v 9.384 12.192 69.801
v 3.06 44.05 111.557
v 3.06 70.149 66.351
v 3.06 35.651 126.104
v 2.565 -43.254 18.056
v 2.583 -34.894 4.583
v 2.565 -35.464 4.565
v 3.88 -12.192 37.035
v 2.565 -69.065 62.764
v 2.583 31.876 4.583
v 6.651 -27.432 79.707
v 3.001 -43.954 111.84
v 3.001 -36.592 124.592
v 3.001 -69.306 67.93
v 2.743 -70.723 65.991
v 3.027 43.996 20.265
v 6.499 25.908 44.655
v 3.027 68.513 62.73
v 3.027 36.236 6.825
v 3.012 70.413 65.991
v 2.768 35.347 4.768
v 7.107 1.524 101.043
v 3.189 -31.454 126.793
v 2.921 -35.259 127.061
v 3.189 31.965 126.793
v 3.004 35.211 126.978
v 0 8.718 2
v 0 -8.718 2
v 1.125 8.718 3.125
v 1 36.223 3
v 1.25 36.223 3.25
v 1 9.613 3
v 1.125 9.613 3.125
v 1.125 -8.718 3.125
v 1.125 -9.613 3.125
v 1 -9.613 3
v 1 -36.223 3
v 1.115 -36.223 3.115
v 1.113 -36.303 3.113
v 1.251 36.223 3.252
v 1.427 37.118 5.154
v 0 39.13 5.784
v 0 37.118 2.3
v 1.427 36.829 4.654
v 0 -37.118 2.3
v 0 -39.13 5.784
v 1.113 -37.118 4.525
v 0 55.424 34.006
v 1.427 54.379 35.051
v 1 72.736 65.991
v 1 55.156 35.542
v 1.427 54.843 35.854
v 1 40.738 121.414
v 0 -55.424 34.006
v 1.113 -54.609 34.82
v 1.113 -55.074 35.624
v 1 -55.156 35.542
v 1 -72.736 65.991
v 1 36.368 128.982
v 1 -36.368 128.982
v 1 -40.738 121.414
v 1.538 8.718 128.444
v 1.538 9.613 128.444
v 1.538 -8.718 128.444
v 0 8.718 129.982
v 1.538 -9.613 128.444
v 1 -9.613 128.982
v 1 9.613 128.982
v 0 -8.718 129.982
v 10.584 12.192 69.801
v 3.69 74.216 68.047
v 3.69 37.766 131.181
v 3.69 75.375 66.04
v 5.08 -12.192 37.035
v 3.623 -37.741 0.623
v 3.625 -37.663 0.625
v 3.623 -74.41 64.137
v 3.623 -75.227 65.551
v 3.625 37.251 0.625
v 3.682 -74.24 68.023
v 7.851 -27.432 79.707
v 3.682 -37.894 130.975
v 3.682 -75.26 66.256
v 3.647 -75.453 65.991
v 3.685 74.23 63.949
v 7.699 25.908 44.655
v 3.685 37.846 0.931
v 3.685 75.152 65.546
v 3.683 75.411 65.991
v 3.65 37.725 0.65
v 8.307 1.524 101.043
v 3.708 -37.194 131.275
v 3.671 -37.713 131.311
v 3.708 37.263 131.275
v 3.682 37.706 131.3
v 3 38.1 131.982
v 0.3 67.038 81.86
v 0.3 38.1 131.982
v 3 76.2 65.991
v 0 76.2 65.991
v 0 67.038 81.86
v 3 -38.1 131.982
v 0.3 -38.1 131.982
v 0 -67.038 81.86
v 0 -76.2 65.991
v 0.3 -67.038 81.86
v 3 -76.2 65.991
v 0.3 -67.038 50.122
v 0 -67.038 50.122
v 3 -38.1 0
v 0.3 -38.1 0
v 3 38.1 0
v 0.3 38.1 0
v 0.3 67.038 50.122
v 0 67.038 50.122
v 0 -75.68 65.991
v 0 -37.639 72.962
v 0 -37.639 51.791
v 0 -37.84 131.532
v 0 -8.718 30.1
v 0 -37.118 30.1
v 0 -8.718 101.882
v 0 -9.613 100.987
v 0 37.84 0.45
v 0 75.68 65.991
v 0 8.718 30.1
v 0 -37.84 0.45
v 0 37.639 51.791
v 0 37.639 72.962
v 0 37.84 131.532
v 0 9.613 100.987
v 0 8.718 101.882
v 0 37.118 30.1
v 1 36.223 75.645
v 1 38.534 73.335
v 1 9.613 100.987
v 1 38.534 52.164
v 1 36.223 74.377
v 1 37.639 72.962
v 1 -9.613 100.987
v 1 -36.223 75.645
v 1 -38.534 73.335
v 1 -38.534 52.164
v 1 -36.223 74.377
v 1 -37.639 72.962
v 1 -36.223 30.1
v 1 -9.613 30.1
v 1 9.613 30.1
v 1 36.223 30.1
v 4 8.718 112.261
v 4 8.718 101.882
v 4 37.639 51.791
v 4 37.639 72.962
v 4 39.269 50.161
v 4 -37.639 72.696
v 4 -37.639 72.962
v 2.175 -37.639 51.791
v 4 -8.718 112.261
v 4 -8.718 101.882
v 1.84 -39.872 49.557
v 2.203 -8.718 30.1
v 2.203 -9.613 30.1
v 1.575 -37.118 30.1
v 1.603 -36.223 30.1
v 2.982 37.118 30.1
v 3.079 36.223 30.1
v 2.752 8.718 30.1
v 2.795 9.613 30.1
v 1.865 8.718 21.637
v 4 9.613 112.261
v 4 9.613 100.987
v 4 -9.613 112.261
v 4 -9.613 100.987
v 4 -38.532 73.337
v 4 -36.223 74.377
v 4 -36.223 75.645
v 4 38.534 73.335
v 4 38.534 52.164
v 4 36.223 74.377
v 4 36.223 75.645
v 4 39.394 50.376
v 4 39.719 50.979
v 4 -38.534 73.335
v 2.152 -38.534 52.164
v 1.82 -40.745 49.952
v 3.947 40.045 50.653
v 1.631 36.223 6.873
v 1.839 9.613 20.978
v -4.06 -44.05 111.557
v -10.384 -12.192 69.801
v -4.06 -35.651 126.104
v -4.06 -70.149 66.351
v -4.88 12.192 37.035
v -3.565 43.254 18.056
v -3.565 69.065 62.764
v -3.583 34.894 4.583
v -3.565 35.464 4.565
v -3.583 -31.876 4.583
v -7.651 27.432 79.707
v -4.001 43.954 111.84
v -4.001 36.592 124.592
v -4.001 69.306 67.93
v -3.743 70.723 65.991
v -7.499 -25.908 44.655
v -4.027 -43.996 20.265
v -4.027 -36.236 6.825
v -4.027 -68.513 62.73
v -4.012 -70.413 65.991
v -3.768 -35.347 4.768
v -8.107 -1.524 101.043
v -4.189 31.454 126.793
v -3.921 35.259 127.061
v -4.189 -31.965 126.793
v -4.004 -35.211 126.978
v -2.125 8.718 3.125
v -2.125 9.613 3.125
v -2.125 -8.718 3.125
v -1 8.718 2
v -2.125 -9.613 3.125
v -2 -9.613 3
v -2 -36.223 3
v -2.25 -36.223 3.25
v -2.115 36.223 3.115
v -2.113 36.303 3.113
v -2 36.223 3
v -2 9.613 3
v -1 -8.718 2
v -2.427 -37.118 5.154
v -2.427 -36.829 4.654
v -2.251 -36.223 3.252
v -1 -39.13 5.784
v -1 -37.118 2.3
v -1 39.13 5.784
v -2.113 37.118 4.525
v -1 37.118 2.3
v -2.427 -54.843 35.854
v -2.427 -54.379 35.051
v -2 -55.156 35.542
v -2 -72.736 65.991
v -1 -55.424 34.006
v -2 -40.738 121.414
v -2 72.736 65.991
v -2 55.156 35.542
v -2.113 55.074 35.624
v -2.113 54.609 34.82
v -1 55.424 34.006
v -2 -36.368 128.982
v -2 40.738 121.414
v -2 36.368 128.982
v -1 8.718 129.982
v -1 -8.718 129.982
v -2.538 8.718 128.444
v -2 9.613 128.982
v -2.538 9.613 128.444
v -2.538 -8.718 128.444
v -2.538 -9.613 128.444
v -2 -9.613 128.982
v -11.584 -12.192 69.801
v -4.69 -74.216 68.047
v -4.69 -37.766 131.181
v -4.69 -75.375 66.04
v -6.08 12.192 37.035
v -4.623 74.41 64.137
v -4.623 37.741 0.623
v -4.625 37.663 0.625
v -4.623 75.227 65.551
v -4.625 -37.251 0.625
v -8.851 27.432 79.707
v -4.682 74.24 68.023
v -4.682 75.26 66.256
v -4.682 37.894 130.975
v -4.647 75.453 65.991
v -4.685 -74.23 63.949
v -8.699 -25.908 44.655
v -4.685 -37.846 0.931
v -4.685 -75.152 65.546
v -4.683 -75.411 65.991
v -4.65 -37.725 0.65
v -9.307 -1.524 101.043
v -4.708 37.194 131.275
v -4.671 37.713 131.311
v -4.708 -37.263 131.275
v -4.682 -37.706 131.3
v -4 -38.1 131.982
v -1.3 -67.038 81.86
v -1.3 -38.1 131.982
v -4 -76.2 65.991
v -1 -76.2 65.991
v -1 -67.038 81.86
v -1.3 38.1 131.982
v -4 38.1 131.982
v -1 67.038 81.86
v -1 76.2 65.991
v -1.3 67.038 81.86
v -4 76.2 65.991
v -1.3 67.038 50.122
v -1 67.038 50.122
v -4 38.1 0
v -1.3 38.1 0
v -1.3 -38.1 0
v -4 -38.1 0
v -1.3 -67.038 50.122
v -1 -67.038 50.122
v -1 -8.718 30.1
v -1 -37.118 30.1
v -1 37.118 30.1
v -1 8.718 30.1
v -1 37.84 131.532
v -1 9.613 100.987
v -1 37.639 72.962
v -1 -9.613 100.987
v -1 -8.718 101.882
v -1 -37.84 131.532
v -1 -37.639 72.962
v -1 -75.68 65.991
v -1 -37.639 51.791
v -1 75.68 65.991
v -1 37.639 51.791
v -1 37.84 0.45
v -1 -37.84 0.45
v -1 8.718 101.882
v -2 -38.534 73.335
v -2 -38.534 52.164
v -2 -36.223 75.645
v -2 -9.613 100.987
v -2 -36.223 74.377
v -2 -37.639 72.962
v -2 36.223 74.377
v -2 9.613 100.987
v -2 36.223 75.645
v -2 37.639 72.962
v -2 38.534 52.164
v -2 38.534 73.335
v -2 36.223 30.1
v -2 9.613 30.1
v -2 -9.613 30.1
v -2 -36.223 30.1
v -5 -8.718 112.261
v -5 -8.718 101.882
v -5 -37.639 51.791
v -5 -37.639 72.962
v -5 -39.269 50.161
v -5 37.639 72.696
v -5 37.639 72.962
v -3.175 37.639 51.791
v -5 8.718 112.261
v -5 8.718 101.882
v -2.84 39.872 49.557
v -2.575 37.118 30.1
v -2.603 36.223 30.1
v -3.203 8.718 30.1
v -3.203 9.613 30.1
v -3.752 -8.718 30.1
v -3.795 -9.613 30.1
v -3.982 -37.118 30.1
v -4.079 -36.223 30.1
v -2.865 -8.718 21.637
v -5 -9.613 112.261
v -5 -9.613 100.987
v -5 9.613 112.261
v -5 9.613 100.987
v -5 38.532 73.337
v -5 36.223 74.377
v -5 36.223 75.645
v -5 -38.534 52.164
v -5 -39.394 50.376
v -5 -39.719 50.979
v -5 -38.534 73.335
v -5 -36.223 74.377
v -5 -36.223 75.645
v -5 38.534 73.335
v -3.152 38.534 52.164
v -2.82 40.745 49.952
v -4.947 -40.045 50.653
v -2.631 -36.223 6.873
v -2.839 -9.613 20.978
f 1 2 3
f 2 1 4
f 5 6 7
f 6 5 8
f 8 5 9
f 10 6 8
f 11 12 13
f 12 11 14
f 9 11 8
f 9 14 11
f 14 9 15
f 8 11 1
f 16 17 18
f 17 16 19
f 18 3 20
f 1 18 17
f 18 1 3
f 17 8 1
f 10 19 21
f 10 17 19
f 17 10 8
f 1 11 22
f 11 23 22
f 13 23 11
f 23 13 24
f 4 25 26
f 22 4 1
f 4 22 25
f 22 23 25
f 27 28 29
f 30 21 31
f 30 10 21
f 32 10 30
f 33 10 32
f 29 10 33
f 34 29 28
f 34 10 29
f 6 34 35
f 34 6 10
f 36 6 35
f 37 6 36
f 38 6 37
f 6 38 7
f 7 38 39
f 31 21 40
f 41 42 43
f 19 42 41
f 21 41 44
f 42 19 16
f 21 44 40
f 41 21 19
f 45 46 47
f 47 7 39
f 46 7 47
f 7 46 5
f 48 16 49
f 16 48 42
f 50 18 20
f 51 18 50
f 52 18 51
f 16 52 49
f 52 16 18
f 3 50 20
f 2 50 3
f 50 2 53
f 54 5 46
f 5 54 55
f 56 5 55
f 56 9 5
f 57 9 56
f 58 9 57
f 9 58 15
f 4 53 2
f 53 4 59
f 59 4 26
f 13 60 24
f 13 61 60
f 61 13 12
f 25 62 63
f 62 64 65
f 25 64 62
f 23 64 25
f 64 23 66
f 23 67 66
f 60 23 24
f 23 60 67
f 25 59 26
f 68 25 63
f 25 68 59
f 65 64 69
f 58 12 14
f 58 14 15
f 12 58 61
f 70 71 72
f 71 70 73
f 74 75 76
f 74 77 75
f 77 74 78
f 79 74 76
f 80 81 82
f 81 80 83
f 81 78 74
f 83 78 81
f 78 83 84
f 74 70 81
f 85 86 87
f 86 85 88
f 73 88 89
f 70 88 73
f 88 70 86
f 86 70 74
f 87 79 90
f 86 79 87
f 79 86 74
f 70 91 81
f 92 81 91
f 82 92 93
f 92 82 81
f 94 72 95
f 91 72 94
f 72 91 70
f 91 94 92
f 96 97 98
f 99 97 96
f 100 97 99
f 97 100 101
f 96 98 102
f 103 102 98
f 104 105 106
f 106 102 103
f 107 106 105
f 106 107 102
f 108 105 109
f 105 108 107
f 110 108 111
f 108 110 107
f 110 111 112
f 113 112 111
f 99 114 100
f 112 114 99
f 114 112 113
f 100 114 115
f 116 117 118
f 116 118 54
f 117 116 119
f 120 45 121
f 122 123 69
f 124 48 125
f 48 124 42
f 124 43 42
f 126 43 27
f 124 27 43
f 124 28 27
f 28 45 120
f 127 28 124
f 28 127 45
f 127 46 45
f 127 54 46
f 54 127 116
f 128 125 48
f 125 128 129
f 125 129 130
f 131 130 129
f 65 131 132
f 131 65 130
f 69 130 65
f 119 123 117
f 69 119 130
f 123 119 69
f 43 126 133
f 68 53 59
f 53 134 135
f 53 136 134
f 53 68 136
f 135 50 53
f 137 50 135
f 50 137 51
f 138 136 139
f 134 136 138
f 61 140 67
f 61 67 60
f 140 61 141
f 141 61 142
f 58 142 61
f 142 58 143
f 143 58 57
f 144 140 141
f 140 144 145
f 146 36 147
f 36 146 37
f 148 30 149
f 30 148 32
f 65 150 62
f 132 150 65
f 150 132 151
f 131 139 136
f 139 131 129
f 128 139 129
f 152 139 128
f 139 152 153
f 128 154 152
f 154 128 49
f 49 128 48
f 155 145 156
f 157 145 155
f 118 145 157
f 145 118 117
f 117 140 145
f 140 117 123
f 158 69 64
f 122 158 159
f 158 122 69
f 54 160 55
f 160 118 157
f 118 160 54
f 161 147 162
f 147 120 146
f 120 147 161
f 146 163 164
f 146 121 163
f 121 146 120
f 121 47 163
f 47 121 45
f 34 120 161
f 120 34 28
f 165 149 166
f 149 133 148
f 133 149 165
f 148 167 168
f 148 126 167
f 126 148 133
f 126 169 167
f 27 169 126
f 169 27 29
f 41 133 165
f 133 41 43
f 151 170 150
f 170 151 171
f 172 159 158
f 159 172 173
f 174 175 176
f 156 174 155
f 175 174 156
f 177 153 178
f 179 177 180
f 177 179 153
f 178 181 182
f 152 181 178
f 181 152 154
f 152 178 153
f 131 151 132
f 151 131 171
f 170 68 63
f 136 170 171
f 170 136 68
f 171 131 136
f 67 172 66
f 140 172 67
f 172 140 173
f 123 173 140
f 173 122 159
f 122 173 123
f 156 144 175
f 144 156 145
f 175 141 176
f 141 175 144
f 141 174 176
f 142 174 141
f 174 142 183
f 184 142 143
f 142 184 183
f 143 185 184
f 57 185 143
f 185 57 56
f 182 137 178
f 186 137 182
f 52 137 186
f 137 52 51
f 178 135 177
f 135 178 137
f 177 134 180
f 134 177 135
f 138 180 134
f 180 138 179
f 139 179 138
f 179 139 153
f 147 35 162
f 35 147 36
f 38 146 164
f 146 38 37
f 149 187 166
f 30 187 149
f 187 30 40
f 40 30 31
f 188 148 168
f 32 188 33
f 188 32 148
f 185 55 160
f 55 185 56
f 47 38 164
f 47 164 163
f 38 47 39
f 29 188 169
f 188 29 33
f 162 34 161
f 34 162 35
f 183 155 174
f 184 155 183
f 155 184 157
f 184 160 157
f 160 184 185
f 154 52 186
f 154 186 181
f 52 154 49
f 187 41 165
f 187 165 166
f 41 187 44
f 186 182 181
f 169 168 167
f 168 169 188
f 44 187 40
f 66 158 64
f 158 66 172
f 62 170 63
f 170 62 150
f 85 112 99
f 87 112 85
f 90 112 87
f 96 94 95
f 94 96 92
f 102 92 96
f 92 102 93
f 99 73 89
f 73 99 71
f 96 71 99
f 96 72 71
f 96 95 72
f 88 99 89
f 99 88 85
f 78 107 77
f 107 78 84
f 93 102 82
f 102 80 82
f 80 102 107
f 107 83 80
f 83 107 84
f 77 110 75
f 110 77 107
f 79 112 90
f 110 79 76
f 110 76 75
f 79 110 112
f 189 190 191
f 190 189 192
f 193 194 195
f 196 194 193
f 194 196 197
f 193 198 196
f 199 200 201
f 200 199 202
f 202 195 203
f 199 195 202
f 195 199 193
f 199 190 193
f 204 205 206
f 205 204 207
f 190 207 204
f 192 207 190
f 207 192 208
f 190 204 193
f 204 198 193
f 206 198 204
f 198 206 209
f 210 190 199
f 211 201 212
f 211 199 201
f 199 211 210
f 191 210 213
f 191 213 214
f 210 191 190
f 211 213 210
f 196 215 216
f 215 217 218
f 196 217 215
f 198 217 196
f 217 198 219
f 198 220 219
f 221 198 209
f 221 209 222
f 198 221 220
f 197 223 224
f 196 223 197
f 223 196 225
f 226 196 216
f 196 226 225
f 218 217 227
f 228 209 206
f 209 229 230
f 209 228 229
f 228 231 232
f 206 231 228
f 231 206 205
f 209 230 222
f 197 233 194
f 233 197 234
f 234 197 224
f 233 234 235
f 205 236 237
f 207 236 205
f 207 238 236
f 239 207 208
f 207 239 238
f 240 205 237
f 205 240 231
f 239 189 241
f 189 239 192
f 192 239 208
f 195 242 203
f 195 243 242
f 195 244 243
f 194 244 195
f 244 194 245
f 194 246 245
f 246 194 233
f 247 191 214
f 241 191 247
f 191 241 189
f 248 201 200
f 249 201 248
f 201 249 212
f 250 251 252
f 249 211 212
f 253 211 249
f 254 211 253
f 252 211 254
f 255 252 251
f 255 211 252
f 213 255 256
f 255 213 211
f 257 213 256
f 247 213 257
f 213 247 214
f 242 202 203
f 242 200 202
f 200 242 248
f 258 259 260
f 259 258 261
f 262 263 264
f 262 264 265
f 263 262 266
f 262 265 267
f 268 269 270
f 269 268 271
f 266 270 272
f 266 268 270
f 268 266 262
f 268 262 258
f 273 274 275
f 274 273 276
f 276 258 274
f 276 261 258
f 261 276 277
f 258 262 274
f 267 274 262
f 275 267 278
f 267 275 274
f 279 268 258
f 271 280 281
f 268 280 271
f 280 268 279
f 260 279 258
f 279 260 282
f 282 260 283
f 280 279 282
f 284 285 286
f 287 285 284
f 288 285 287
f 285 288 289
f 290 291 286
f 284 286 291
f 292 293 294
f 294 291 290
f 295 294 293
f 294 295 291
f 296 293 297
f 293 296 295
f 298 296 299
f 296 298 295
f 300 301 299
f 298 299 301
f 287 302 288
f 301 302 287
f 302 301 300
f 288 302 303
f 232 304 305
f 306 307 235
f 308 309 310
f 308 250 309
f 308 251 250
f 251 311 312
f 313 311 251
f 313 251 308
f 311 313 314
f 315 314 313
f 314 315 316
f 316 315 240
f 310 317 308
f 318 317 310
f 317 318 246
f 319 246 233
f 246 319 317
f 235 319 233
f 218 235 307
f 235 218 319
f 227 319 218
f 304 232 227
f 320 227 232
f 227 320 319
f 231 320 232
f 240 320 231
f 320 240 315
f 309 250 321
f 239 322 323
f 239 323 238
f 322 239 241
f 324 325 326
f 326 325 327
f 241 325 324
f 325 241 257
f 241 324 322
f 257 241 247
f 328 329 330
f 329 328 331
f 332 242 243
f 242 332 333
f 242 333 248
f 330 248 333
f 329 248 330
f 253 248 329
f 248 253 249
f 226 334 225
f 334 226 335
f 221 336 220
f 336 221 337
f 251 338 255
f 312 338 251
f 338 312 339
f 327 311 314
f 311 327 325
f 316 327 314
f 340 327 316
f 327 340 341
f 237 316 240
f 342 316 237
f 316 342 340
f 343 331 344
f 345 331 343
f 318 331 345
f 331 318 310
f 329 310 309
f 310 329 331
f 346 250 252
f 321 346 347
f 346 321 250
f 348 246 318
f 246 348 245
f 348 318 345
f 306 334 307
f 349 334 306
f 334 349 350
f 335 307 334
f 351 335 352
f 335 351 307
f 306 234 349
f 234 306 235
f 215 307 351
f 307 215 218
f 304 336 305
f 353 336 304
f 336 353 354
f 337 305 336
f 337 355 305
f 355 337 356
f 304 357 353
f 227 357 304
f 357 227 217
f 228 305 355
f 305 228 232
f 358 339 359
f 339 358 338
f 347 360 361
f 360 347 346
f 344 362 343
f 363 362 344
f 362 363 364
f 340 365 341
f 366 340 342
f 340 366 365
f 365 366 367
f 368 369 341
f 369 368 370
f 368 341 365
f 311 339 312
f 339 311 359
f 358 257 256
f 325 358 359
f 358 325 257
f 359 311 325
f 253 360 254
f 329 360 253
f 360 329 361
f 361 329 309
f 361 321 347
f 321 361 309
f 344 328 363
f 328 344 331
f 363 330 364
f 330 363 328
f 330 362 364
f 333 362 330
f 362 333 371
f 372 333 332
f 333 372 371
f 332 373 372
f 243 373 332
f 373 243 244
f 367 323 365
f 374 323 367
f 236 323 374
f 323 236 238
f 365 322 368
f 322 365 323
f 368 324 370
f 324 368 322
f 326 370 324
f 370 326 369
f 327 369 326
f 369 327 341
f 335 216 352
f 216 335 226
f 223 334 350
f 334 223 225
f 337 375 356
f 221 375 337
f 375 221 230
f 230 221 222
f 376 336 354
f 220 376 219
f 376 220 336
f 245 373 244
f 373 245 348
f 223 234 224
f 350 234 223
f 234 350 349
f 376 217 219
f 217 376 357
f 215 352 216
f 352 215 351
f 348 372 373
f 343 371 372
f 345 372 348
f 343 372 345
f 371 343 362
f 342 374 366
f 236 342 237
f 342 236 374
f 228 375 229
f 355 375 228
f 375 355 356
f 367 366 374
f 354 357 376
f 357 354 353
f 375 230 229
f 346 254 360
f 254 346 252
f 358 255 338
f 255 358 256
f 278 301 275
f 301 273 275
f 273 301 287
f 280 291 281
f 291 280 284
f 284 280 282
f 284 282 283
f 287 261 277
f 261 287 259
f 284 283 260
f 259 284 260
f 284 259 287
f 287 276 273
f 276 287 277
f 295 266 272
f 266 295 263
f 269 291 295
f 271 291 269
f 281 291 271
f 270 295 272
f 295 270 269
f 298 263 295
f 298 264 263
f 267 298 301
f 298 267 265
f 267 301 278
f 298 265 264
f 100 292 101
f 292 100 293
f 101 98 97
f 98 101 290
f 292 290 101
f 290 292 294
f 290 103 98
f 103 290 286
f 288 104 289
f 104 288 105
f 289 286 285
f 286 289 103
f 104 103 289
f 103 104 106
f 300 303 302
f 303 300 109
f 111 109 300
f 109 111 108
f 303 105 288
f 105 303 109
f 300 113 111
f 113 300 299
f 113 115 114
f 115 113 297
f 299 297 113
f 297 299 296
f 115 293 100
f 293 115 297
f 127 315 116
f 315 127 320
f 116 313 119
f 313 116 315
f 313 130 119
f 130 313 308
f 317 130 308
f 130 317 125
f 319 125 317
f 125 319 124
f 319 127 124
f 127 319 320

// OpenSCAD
// Hexagon wall tile v47 — parametric rebuild of v30
// Front: identical low-poly facets to v30 (same facet angles at every size).
// Edge profile: identical on every size (edge depth, rim width) so tiles butt flush.
// Back: six corner pads for 1" (25 mm) double-sided mounting tape.
// v32: tape pads are flat plates hung from the rim with an air gap to the front skin.
// v33: thinner skin + thinner pads so the air gap is 1.4 mm even right at the edges
//      (v32 had only 0.8 mm there and showed marks along the slanted edges).
// v34: snap-off stabilizer fins behind the bottom edge so the tall, thin tile can't tip over
//      while printing. Break them off afterwards (bend sideways) and the back stays flat.
// v35: 0.6 mm 45° chamfer on the front edge (crisp, consistent shadow line between tiles; hides
//      first-layer squish and brim trim marks) + relief_scale to deepen the facets if wanted.
// v37: much smaller breakaway tabs (0.8 x 0.6 mm, every 8 mm) so the fins snap off easily.
// v38: full-height snap-off BRACE FRAME behind the tile: a thin hex ring + X/vertical bars,
//      1 mm behind the back, tied to the tile rim by tiny tabs all the way round (incl. the top).
//      Tile + brace act as a stiff box while printing; the fins now sit on the brace.
//      Peel the brace off after printing — the tabs only touch the back rim.
// v39: PAIR mode (default): two identical tiles printed back-to-back, 0.4 mm apart, so each
//      cradles the other full-height. Only 12 tiny tabs (corners + mid-sides) join the back
//      rims — twist/peel the tiles apart. No brace, no fins, almost no waste. The pair is
//      turned 90° on the bed so the 'back' seam lands on a side edge, not on either face.
// v40: pair tabs spaced evenly every ~pair_tab_pitch mm round the rim on EVERY size. In v39 the
//      tab spacing grew with the tile (3": ~23 mm max gap, 6": ~46 mm, 10": ~79 mm), so the 3" pair
//      printed perfectly but the 6" rims flexed apart between tabs and broke up above mid-height.
//      Now every size has the same tab spacing as a stiff 3" pair (or tighter).
// v42: tabs replaced by one continuous hairline SEAM round the outer edge of the pair gap.
//      Discrete tabs changed the toolpath on every layer that had a tab, leaving a faint line
//      across the tile every ~10 mm of height. With a continuous seam every layer has the same
//      shape, so there is nothing to print differently. Separate the tiles by running a utility
//      knife along the seam line on the edges, then twist apart.
// v43: stiffer tape pads — each pad now grows from the back plane toward the front until it is
//      pad_gap (1.4 mm) from the skin, instead of being a 1 mm plate (the skin stays untouched, so
//      no ghost lines). Larger tiles (>= mid_pad_min_in)
//      get four extra pads at the slanted mid-edges: 10 tape spots on the 10".
// v44: UNIFORM pads. Every pad is the same PAD x PAD tape square, pushed snug into its corner
//      (touching both rims), with only a small 45° gusset beneath it down to the rim so it prints
//      without support. Because a hex corner is the same angle at every size, the 6" and 10" pads
//      are identical in shape and size; the 3" uses the same layout with smaller squares.
//      The 10" adds the same square at the middle of each slanted edge.
// v46: pads are a 1 mm plate with a stiffening LIP round the free edges (like a shallow tray),
//      instead of solid-filled — nearly the stiffness of v44's deep pads at close to v42 print time.
// v47: pair gap 0.4 -> 1.0 mm. At 0.4 mm the squashed back walls of the two tiles touched and
//      fused, so v42-v46 pairs would not come apart. At 1.0 mm only the hairline edge seam joins
//      them: cut it with a utility knife (there is now room for the blade) and they separate.
// Prints upright on a flat edge with NO supports (every downward edge is 45° or steeper).
//
// Export one size at a time, e.g.:
//   openscad -D size_in=6 -o hex_pair_v47_6in.stl hex_wall_tile_v47.scad

/* [Size] */
size_in       = 6;      // point-to-point width in inches (3, 6, 10 ...)

/* [Edge profile — keep identical across sizes] */
// Space behind the skin at the edge = edge_depth - skin; it must be >= pad_plate + pad_gap + pad_recess.
edge_depth    = 3.6;    // depth of the outer edge, back plane to front face (mm)
rim           = 2.0;    // perimeter wall thickness at the back plane (mm)
front_chamfer = 0.6;    // 45° chamfer on the front edge (mm); 0 = sharp edge

/* [Look] */
relief_scale  = 1.0;    // 1.0 = v30 facets; 1.5 = 50% deeper facets (same edge profile on all sizes)

/* [Front skin] */
skin          = 1.2;    // front skin thickness (mm) — 3 lines at 0.4 mm, same on all sizes

/* [Tape pads] */
tape_width    = 25.4;   // tape width (mm)
pad_margin    = 3;      // extra pad width beyond the tape (mm)
pad_max_frac  = 0.45;   // pad never larger than this fraction of the tile radius (keeps 3" usable)
pad_plate     = 1.0;    // minimum pad thickness (mm) — at the very edge, where there is least room
pad_depth     = 4;      // stiffening lip depth (mm); always stops pad_gap from the skin
pad_lip       = 0.9;    // lip thickness (mm) — two lines
mid_pad_min_in = 8;     // tiles this size or larger also get pads at the four slanted mid-edges
pad_gap       = 1.4;    // minimum air gap between pads and the front skin (mm) — keeps the front clean
pad_recess    = 0;      // pads set back from the rim (mm); >0 lets the rim touch the wall,
                        // but near the edges the plate is then trimmed thinner to keep pad_gap

/* [Print stabilizers (snap off after printing)] */
stabilizers   = false;  // v34-v38 option; not needed in pair mode
fin_count     = 2;      // fins behind the bottom edge, placed symmetrically
fin_thick     = 1.6;    // fin thickness (mm)
fin_height_frac = 0.35; // fin height as a fraction of the tile height
fin_depth_frac  = 0.4;  // fin depth behind the brace as a fraction of fin height
fin_depth_min   = 15;   // (mm)
fin_gap       = 0.5;    // air gap between fin and tile back (mm)
tab_height    = 0.6;    // breakaway tab height (mm, vertical when printing) — 3 layers at 0.2
tab_width     = 0.8;    // breakaway tab width (mm), centred on the fin — 2 lines
tab_pitch     = 8;      // spacing between tabs (mm)

/* [Full-height brace frame (snap off after printing)] */
brace         = false;  // v38 option; not needed in pair mode
brace_gap     = 1.0;    // air gap between tile back and brace (mm)
brace_thick   = 1.6;    // brace thickness (mm)
brace_rim_w   = 4;      // width of the brace's hex ring (mm)
brace_bar_w   = 3;      // width of the X and vertical bars (mm)
brace_tab_pitch = 10;   // spacing of brace tabs along each rim side (mm)
brace_tab     = 0.8;    // brace tab size (mm) — tiny, so the brace peels off

/* [Back-to-back pair (default)] */
pair          = true;
pair_gap      = 1.0;    // gap between the two back planes (mm) — v47: 1.0 so the backs cannot fuse; the edge seam alone joins them
pair_tab      = 0.6;    // tab size (mm) — tiny, so the pair twists apart
pair_tab_pitch = 12;    // (v40 tabs, unused when pair_seam_w > 0)
pair_seam_w   = 0.45;   // width of the continuous edge seam bridging the gap (mm) — about one line

/* [Output] */
orient_for_print = true; // stand upright on a flat edge, back facing +Y

/* [Hidden] */
R   = size_in * 25.4 / 2;         // corner radius
AP  = R * cos(30);                // apothem
PAD = min(tape_width + pad_margin, R * pad_max_frac);

// Normalised front geometry from v30 (x, y in units of R; z = relief above edge, units of R)
FP = [[1,0,0],[0.5,0.866025,0],[-0.5,0.866025,0],[-1,0,0],[-0.5,-0.866025,0],[0.5,-0.866025,0],
      [0.16,0.05,0.091654],[-0.16,-0.38,0.019428],[-0.36,0.18,0.05579],[0.34,-0.28,0.053795],[0.02,0.46,0.061766]];
FACES = [[0,6,1],[4,3,7],[5,4,7],[8,3,2],[7,3,8],[7,8,6],[5,9,0],[9,6,0],[9,7,6],[5,7,9],
         [6,8,10],[8,2,10],[6,10,1],[10,2,1],
         [1,12,11,0],[2,13,12,1],[3,14,13,2],[4,15,14,3],[5,16,15,4],[0,11,16,5],
         [11,12,13,14,15,16]];
RELIEF_MAX = 0.091654 * R * relief_scale;
D = edge_depth + RELIEF_MAX + 1;  // max depth used for chamfers

// Solid bounded by the faceted front (shifted by dz) and a flat back at z = zb
module body(dz = 0, zb = 0) {
    pts = concat(
        [for (p = FP) [p[0]*R, p[1]*R, edge_depth + p[2]*R*relief_scale + dz]],
        [for (i = [0:5]) [FP[i][0]*R, FP[i][1]*R, zb]]);
    polyhedron(points = pts, faces = FACES, convexity = 4);
}

module hex2d(apothem) { circle(r = apothem / cos(30), $fn = 6); }

// Back cavity: behind the skin, inside the rim; rim inner faces slope 45° so nothing needs support
module cavity(extra = 0) {
    H  = D + 2;
    a0 = AP - rim - extra + 1;             // apothem at z = -1
    intersection() {
        body(dz = -skin - extra, zb = -1);
        translate([0, 0, -1]) linear_extrude(height = H, scale = (a0 - H) / a0) hex2d(a0);
    }
}

// ---- Uniform tape pads ----------------------------------------------------------------
PA = AP - rim + 0.3;                    // inner apothem used for pads (0.3 mm overlap fuses them to the rim)
PH = PAD / 2;
function nrm(a) = [cos(a), sin(a)];
function lim(a) = PA - PH * (abs(cos(a)) + abs(sin(a)));     // max n.c for an axis-aligned PAD square
// centre of a PAD square snug in the corner at angle t (touches the two rims meeting there)
function corner_c(t) = let(n1 = nrm(t - 30), n2 = nrm(t + 30), b1 = lim(t - 30), b2 = lim(t + 30), d = sin(60))
    [(b1*n2[1] - b2*n1[1]) / d, (n1[0]*b2 - n2[0]*b1) / d];
// centre of a PAD square snug against the middle of the edge whose normal is at angle a
function edge_c(a) = lim(a) * nrm(a);
// downward 45° (or vertical) gusset direction toward the nearest rim below — printed upright, model -y is down
function gdir(t) = (cos(t) > 0.1) ? [1, -1] : (cos(t) < -0.1) ? [-1, -1] : [0, -1];

module pad_sq(c, dir) {
    intersection() {
        hex2d(PA);
        hull() { translate(c) square(PAD, center = true); translate(c + dir * R) square(PAD, center = true); }
    }
}
module pad_fp(k)  { t = 60*k;      pad_sq(corner_c(t), (k == 4 || k == 5) ? [0, -1] : gdir(t)); }
module mid_fp(k)  { a = 30 + 60*k; pad_sq(edge_c(a),   (k == 3 || k == 5) ? [0, -1] : gdir(a)); }

module pad_fps() {
    for (k = [0:5]) pad_fp(k);
    if (size_in >= mid_pad_min_in) for (k = [0, 2, 3, 5]) mid_fp(k);
}
module pads() {
    intersection() {
        body(dz = -skin - pad_gap, zb = -1);       // never closer than pad_gap to the skin
        translate([0, 0, pad_recess]) union() {
            linear_extrude(pad_plate) pad_fps();                      // flat tape plate
            linear_extrude(max(pad_plate, pad_depth))                 // lip round the side/lower edges
                difference() {                                        // (no lip along upward-facing edges:
                    pad_fps();                                        //  printed upright it would start in mid-air)
                    minkowski() { offset(delta = -pad_lip) pad_fps(); translate([-0.005, 0]) square([0.01, 2*R]); }
                }
        }
    }
}

module chamfer_clip() {
    HB = D + 5;
    union() {
        translate([0, 0, -2]) linear_extrude(edge_depth - front_chamfer + 2) hex2d(AP + 1);
        translate([0, 0, edge_depth - front_chamfer]) linear_extrude(height = HB, scale = (AP - HB) / AP) hex2d(AP);
    }
}

module tile() {
    intersection() {
        union() {
            difference() { body(); cavity(); }
            pads();
        }
        if (front_chamfer > 0) chamfer_clip(); else translate([-2*R, -2*R, -5]) cube([4*R, 4*R, 4*R]);
    }
}

// Triangular fins standing on the bed behind the back (model z < 0), joined to the tile by small tabs
FIN_H = fin_height_frac * 2 * AP;
FIN_L = max(fin_depth_min, fin_depth_frac * FIN_H);
function fin_x(i) = (fin_count == 1) ? 0 : (-1 + 2 * i / (fin_count - 1)) * 0.35 * R;
BZ = brace ? brace_gap + brace_thick : 0;          // fins start behind the brace when it is used
module stabilizer_fins() {
    for (i = [0 : fin_count - 1]) {
        x = fin_x(i);
        fg = brace ? BZ - 0.3 : fin_gap;                // with a brace: fused into it (no tabs needed)
        hull() {                                            // fin: vertical triangle
            translate([x - fin_thick/2, -AP, -fg - FIN_L]) cube([fin_thick, 0.01, FIN_L]);
            translate([x - fin_thick/2, -AP, -fg - 0.01]) cube([fin_thick, FIN_H, 0.01]);
        }
        if (!brace)
            for (y = [0 : tab_pitch : FIN_H - tab_height])  // breakaway tabs into the back plane
                translate([x - tab_width/2, -AP + y, -fin_gap - 0.05]) cube([tab_width, tab_height, fin_gap + 0.35]);
    }
}

// Brace frame (2D, in the tile plane). Printed upright, so every downward-facing edge is >= 45°:
// the top bar is carried by 45° roofs in the two top windows; bars run vertical or at ±60°.
module brace_2d() {
    W  = brace_rim_w;
    Yt = AP - W;                                        // underside of the top ring bar
    difference() {
        hex2d(AP);
        intersection() {                                // the open window, with a 45° roof under the top bar
            hex2d(AP - W);
            // only the two top windows touch the top bar: give them a 45° valley roof
            polygon([[-2*R, -2*R], [2*R, -2*R], [2*R, 2*R], [R/2, 2*R], [R/2, Yt],
                     [0, Yt - R/2], [-R/2, Yt], [-R/2, 2*R], [-2*R, 2*R]]);
        }
    }
    intersection() {
        hex2d(AP);
        union() {
            square([brace_bar_w, 2*AP], center = true);                 // vertical bar
            rotate(60)  square([4*R, brace_bar_w], center = true);      // ±60° diagonals (corner to corner)
            rotate(-60) square([4*R, brace_bar_w], center = true);
        }
    }
}

module brace_frame() {
    translate([0, 0, -BZ]) linear_extrude(brace_thick) brace_2d();
    // tiny tabs across the gap, on the tile's back rim (1 mm in from the outline), all six sides
    for (k = [0:5]) {
        a0 = 60*k; a1 = 60*(k+1);
        p0 = [ (R - 1/sin(60)) * cos(a0), (R - 1/sin(60)) * sin(a0) ];
        p1 = [ (R - 1/sin(60)) * cos(a1), (R - 1/sin(60)) * sin(a1) ];
        L  = norm(p1 - p0);
        n  = floor((L - 6) / brace_tab_pitch);
        for (j = [0 : n]) {
            t = (3 + j * (L - 6) / max(n, 1)) / L;
            p = p0 + t * (p1 - p0);
            translate([p[0], p[1], -brace_gap - 0.3]) rotate(a0 + 120)
                translate([-brace_tab/2, -brace_tab/2, 0]) cube([brace_tab, brace_tab, brace_gap + 0.6]);
        }
    }
}

// Tabs across the pair gap, evenly spaced along each rim side (1 mm in from the outline)
module pair_tabs() {
    rr = R - 1/sin(60);
    n  = max(2, ceil(rr / pair_tab_pitch));          // side length = rr
    for (k = [0:5]) for (i = [0:n-1]) {
        f  = (i + 0.5) / n;
        a0 = 60*k; a1 = 60*(k+1);
        p = [rr*cos(a0), rr*sin(a0)] + f * ([rr*cos(a1), rr*sin(a1)] - [rr*cos(a0), rr*sin(a0)]);
        translate([p[0], p[1], -pair_gap - 0.3]) rotate(a0 + 120)
            translate([-pair_tab/2, -pair_tab/2, 0]) cube([pair_tab, pair_tab, pair_gap + 0.6]);
    }
}
// Continuous hairline seam round the outline, bridging the gap between the two back planes
module pair_seam() {
    translate([0, 0, -pair_gap - 0.3]) linear_extrude(pair_gap + 0.6)
        difference() { hex2d(AP); hex2d(AP - pair_seam_w); }
}
module partner() { translate([0, 0, -pair_gap]) rotate([0, 180, 0]) tile(); }   // same tile turned round, not mirrored

module assembly() {
    tile();
    if (pair) { partner(); if (pair_seam_w > 0) pair_seam(); else pair_tabs(); }
    else { if (brace) brace_frame(); if (stabilizers) stabilizer_fins(); }
}

if (orient_for_print)
    rotate([0, 0, pair ? 90 : 0]) translate([0, 0, AP]) rotate([90, 0, 0]) assembly();
else
    assembly();
